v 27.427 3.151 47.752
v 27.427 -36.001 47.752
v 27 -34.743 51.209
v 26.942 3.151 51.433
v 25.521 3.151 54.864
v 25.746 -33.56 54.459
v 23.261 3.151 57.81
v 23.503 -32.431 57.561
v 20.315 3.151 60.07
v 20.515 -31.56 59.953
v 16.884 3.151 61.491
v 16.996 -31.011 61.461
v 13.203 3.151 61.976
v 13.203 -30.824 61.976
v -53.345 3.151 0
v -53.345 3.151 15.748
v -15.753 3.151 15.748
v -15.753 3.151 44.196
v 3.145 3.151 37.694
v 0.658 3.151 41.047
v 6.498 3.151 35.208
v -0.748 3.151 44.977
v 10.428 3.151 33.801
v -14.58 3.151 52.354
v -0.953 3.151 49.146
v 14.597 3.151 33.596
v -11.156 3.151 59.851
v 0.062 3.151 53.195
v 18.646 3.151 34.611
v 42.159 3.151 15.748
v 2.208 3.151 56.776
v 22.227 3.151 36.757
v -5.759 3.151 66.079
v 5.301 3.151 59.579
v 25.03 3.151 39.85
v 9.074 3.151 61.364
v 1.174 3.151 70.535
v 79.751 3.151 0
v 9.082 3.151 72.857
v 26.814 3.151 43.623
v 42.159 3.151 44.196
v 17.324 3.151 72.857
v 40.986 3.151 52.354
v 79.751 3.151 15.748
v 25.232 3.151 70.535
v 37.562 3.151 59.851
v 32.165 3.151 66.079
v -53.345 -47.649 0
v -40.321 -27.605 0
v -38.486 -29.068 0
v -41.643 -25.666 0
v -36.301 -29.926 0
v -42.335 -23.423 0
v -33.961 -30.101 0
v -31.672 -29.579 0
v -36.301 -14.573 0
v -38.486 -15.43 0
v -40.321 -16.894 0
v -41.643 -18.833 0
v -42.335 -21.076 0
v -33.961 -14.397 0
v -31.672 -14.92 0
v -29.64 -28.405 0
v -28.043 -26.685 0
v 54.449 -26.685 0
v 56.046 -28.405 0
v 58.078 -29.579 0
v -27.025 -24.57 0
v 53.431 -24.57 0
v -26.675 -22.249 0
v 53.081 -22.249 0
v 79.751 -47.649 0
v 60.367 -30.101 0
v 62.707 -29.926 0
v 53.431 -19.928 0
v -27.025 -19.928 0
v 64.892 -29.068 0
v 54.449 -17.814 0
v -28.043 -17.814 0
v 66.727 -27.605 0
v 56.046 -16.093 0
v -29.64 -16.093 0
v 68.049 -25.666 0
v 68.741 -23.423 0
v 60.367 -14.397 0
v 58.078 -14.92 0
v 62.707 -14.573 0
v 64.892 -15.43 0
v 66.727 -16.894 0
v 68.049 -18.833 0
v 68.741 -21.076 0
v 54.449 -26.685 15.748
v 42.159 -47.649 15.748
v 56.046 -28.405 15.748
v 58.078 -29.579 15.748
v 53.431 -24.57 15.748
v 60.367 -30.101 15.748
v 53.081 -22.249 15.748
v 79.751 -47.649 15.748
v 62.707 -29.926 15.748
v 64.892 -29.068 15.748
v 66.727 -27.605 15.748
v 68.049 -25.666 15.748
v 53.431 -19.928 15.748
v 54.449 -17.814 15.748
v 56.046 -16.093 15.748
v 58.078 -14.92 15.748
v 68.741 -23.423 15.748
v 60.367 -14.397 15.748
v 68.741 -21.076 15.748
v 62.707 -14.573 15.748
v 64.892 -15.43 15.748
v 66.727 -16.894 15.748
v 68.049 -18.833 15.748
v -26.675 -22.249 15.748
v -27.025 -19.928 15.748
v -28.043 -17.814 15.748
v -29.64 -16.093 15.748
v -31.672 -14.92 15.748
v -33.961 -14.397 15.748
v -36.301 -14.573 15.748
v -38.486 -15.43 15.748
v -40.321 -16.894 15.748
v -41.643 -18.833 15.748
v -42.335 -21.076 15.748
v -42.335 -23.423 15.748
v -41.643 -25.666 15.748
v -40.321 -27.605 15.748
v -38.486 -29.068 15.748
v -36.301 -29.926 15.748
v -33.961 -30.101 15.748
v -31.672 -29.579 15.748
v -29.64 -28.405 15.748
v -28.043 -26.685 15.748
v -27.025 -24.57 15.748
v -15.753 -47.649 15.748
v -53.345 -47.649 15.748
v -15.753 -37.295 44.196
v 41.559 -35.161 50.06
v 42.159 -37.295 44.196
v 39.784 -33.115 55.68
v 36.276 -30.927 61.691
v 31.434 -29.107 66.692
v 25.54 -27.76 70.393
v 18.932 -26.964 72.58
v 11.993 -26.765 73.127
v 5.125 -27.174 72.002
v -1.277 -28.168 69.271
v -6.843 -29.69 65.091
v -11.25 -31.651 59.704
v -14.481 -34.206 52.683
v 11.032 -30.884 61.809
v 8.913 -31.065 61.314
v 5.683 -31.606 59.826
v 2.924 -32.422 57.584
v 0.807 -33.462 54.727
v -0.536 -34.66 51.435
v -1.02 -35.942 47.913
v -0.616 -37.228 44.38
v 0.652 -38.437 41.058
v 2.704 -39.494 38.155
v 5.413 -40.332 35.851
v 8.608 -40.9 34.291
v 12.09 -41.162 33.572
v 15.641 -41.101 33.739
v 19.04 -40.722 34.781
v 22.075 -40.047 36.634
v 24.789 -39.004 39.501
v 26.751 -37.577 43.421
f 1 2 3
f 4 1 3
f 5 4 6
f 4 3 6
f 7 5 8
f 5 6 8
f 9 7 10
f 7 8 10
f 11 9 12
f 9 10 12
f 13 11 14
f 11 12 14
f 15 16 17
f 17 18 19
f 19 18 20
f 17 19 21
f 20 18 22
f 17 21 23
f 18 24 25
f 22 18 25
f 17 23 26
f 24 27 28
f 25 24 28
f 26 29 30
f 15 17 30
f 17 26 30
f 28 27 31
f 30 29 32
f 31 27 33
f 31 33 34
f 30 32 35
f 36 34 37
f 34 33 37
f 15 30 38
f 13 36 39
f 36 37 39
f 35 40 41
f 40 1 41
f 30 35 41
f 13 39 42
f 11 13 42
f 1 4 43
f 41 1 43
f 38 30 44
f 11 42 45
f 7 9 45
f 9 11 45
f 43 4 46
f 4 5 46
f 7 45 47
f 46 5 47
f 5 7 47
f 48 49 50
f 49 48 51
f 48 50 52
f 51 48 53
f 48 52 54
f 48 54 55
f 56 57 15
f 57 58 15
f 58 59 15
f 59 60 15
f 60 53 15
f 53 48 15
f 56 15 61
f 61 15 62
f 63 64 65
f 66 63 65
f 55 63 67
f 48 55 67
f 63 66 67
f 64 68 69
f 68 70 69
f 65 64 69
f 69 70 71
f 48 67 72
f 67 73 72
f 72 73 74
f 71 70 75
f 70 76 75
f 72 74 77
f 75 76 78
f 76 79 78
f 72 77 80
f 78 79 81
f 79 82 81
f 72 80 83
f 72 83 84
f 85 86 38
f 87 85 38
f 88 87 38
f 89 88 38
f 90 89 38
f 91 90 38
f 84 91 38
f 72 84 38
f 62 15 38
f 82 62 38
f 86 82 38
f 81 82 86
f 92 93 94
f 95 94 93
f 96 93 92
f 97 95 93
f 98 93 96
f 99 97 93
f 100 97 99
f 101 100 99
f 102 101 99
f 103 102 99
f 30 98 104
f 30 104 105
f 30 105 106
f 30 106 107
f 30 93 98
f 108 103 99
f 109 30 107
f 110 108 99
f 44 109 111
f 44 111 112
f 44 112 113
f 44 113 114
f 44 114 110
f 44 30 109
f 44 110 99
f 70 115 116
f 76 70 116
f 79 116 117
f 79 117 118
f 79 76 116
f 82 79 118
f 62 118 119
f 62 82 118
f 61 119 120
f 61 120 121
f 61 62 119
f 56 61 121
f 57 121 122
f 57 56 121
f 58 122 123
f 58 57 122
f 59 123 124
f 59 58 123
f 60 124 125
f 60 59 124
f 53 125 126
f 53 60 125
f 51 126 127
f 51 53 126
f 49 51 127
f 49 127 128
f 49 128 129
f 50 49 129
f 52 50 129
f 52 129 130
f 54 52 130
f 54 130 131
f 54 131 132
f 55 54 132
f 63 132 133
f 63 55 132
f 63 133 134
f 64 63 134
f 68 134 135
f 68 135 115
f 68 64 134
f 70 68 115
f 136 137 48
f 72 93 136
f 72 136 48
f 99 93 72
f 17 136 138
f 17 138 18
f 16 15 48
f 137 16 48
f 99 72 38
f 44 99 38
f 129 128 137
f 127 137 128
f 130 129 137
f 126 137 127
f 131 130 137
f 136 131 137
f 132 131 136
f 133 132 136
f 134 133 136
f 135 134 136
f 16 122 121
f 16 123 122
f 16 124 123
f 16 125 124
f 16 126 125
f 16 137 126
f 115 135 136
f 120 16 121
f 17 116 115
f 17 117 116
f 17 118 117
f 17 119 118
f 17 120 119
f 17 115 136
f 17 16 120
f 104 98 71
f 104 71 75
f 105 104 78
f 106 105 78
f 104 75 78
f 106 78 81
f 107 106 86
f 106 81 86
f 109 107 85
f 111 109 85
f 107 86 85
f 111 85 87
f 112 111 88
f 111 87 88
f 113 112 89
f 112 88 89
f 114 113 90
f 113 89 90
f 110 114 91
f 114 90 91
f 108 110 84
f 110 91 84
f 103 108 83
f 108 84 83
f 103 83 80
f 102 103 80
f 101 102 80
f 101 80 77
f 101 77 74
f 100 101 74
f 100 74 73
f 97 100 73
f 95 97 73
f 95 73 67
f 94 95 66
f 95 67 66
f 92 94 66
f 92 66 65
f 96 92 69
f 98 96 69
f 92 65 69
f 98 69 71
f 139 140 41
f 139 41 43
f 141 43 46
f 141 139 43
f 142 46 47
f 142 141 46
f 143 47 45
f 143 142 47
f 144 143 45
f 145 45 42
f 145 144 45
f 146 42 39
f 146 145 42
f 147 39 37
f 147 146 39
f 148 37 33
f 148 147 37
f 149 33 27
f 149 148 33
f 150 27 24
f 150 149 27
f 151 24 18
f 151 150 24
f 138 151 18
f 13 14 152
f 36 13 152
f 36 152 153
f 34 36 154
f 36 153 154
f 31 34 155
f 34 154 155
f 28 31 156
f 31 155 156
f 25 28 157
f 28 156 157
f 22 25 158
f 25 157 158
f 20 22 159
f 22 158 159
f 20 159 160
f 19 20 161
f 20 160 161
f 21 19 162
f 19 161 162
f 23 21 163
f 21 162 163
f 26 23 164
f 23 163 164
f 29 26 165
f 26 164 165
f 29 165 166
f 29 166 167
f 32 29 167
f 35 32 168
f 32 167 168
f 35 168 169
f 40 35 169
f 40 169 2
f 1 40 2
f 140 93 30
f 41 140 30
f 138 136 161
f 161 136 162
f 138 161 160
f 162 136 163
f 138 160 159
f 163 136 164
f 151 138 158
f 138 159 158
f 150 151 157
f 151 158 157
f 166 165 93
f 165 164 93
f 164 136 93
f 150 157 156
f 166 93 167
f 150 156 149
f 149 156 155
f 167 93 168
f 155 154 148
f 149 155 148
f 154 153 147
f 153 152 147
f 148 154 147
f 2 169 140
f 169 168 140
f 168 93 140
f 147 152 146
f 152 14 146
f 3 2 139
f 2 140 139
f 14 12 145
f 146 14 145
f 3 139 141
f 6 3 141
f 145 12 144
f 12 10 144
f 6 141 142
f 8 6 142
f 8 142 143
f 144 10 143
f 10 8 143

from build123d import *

# Parameters (mm, degrees)
F0_R      = 7.874
F1_DEPTH  = 15.748
F2_W      = 57.912
F2_H      = 50.8
F3_DEPTH  = 3.048
F3_FACE_W = 57.912
F3_FACE_H = 50.8
F4_DEPTH  = 25.4
F5_R      = 28.956
F6_DEPTH  = 50.8
F8_DEPTH  = 50.8
F10_DEPTH = 177.8


with BuildPart() as f1:
    # F0 (on Top) → F1 (new body)
    with BuildSketch(Plane.XY):
        Polygon((13.202934, 3.150654), (-53.345066, 3.150654), (-53.345066, -47.649346), (13.202934, -47.649346), (13.202934, -22.249346), align=None)
        with Locations((-34.549066, -22.249346)):
            Circle(F0_R, mode=Mode.SUBTRACT)
        with BuildLine():
            ThreePointArc((68.828934, -22.249346), (60.954934, -14.375346), (53.080934, -22.249346))
            ThreePointArc((53.080934, -22.249346), (60.954934, -30.123346), (68.828934, -22.249346))
        make_face()
        Polygon((79.750934, 3.150654), (13.202934, 3.150654), (13.202934, -22.249346), (13.202934, -47.649346), (79.750934, -47.649346), align=None)
        with BuildLine():
            ThreePointArc((68.828934, -22.249346), (60.954934, -30.123346), (53.080934, -22.249346))
            ThreePointArc((53.080934, -22.249346), (60.954934, -14.375346), (68.828934, -22.249346))
        make_face(mode=Mode.SUBTRACT)
    extrude(amount=F1_DEPTH)

    # F2 (on face) → F3 (join)
    with BuildSketch(Plane.XY.offset(15.748)):
        with Locations((13.202934, -22.249346)):
            Rectangle(F2_W, F2_H)
    extrude(amount=F3_DEPTH)

    # F3_face (on face) → F4 (join)
    with BuildSketch(Plane(origin=(13.202934, -22.249346, 18.796), x_dir=(1, 0, 0), z_dir=(0, 0, 1))):
        Rectangle(F3_FACE_W, F3_FACE_H)
    extrude(amount=F4_DEPTH)

    # F5 (on face) → F6 (join)
    with BuildSketch(Plane.XZ.offset(47.649346)):
        with Locations((13.202934, 44.196)):
            Circle(F5_R)
    extrude(amount=-F6_DEPTH)

    # F7 (on face) → F8 (cut)
    with BuildSketch(Plane.XZ.offset(47.649346)):
        with BuildLine():
            ThreePointArc((13.202934, 61.976), (3.145047, 37.694113), (27.426934, 47.752))
            ThreePointArc((27.426934, 47.752), (23.260821, 57.809887), (13.202934, 61.976))
        make_face()
    extrude(amount=-F8_DEPTH, mode=Mode.SUBTRACT)

    # F9 (on face) → F10 (cut)
    with BuildSketch(Plane.YZ.offset(42.158934)):
        Polygon((-47.649346, 73.572527), (-47.649346, 15.748), (-26.602939, 73.572527), align=None)
    extrude(amount=-F10_DEPTH, mode=Mode.SUBTRACT)


solid = f1.part
